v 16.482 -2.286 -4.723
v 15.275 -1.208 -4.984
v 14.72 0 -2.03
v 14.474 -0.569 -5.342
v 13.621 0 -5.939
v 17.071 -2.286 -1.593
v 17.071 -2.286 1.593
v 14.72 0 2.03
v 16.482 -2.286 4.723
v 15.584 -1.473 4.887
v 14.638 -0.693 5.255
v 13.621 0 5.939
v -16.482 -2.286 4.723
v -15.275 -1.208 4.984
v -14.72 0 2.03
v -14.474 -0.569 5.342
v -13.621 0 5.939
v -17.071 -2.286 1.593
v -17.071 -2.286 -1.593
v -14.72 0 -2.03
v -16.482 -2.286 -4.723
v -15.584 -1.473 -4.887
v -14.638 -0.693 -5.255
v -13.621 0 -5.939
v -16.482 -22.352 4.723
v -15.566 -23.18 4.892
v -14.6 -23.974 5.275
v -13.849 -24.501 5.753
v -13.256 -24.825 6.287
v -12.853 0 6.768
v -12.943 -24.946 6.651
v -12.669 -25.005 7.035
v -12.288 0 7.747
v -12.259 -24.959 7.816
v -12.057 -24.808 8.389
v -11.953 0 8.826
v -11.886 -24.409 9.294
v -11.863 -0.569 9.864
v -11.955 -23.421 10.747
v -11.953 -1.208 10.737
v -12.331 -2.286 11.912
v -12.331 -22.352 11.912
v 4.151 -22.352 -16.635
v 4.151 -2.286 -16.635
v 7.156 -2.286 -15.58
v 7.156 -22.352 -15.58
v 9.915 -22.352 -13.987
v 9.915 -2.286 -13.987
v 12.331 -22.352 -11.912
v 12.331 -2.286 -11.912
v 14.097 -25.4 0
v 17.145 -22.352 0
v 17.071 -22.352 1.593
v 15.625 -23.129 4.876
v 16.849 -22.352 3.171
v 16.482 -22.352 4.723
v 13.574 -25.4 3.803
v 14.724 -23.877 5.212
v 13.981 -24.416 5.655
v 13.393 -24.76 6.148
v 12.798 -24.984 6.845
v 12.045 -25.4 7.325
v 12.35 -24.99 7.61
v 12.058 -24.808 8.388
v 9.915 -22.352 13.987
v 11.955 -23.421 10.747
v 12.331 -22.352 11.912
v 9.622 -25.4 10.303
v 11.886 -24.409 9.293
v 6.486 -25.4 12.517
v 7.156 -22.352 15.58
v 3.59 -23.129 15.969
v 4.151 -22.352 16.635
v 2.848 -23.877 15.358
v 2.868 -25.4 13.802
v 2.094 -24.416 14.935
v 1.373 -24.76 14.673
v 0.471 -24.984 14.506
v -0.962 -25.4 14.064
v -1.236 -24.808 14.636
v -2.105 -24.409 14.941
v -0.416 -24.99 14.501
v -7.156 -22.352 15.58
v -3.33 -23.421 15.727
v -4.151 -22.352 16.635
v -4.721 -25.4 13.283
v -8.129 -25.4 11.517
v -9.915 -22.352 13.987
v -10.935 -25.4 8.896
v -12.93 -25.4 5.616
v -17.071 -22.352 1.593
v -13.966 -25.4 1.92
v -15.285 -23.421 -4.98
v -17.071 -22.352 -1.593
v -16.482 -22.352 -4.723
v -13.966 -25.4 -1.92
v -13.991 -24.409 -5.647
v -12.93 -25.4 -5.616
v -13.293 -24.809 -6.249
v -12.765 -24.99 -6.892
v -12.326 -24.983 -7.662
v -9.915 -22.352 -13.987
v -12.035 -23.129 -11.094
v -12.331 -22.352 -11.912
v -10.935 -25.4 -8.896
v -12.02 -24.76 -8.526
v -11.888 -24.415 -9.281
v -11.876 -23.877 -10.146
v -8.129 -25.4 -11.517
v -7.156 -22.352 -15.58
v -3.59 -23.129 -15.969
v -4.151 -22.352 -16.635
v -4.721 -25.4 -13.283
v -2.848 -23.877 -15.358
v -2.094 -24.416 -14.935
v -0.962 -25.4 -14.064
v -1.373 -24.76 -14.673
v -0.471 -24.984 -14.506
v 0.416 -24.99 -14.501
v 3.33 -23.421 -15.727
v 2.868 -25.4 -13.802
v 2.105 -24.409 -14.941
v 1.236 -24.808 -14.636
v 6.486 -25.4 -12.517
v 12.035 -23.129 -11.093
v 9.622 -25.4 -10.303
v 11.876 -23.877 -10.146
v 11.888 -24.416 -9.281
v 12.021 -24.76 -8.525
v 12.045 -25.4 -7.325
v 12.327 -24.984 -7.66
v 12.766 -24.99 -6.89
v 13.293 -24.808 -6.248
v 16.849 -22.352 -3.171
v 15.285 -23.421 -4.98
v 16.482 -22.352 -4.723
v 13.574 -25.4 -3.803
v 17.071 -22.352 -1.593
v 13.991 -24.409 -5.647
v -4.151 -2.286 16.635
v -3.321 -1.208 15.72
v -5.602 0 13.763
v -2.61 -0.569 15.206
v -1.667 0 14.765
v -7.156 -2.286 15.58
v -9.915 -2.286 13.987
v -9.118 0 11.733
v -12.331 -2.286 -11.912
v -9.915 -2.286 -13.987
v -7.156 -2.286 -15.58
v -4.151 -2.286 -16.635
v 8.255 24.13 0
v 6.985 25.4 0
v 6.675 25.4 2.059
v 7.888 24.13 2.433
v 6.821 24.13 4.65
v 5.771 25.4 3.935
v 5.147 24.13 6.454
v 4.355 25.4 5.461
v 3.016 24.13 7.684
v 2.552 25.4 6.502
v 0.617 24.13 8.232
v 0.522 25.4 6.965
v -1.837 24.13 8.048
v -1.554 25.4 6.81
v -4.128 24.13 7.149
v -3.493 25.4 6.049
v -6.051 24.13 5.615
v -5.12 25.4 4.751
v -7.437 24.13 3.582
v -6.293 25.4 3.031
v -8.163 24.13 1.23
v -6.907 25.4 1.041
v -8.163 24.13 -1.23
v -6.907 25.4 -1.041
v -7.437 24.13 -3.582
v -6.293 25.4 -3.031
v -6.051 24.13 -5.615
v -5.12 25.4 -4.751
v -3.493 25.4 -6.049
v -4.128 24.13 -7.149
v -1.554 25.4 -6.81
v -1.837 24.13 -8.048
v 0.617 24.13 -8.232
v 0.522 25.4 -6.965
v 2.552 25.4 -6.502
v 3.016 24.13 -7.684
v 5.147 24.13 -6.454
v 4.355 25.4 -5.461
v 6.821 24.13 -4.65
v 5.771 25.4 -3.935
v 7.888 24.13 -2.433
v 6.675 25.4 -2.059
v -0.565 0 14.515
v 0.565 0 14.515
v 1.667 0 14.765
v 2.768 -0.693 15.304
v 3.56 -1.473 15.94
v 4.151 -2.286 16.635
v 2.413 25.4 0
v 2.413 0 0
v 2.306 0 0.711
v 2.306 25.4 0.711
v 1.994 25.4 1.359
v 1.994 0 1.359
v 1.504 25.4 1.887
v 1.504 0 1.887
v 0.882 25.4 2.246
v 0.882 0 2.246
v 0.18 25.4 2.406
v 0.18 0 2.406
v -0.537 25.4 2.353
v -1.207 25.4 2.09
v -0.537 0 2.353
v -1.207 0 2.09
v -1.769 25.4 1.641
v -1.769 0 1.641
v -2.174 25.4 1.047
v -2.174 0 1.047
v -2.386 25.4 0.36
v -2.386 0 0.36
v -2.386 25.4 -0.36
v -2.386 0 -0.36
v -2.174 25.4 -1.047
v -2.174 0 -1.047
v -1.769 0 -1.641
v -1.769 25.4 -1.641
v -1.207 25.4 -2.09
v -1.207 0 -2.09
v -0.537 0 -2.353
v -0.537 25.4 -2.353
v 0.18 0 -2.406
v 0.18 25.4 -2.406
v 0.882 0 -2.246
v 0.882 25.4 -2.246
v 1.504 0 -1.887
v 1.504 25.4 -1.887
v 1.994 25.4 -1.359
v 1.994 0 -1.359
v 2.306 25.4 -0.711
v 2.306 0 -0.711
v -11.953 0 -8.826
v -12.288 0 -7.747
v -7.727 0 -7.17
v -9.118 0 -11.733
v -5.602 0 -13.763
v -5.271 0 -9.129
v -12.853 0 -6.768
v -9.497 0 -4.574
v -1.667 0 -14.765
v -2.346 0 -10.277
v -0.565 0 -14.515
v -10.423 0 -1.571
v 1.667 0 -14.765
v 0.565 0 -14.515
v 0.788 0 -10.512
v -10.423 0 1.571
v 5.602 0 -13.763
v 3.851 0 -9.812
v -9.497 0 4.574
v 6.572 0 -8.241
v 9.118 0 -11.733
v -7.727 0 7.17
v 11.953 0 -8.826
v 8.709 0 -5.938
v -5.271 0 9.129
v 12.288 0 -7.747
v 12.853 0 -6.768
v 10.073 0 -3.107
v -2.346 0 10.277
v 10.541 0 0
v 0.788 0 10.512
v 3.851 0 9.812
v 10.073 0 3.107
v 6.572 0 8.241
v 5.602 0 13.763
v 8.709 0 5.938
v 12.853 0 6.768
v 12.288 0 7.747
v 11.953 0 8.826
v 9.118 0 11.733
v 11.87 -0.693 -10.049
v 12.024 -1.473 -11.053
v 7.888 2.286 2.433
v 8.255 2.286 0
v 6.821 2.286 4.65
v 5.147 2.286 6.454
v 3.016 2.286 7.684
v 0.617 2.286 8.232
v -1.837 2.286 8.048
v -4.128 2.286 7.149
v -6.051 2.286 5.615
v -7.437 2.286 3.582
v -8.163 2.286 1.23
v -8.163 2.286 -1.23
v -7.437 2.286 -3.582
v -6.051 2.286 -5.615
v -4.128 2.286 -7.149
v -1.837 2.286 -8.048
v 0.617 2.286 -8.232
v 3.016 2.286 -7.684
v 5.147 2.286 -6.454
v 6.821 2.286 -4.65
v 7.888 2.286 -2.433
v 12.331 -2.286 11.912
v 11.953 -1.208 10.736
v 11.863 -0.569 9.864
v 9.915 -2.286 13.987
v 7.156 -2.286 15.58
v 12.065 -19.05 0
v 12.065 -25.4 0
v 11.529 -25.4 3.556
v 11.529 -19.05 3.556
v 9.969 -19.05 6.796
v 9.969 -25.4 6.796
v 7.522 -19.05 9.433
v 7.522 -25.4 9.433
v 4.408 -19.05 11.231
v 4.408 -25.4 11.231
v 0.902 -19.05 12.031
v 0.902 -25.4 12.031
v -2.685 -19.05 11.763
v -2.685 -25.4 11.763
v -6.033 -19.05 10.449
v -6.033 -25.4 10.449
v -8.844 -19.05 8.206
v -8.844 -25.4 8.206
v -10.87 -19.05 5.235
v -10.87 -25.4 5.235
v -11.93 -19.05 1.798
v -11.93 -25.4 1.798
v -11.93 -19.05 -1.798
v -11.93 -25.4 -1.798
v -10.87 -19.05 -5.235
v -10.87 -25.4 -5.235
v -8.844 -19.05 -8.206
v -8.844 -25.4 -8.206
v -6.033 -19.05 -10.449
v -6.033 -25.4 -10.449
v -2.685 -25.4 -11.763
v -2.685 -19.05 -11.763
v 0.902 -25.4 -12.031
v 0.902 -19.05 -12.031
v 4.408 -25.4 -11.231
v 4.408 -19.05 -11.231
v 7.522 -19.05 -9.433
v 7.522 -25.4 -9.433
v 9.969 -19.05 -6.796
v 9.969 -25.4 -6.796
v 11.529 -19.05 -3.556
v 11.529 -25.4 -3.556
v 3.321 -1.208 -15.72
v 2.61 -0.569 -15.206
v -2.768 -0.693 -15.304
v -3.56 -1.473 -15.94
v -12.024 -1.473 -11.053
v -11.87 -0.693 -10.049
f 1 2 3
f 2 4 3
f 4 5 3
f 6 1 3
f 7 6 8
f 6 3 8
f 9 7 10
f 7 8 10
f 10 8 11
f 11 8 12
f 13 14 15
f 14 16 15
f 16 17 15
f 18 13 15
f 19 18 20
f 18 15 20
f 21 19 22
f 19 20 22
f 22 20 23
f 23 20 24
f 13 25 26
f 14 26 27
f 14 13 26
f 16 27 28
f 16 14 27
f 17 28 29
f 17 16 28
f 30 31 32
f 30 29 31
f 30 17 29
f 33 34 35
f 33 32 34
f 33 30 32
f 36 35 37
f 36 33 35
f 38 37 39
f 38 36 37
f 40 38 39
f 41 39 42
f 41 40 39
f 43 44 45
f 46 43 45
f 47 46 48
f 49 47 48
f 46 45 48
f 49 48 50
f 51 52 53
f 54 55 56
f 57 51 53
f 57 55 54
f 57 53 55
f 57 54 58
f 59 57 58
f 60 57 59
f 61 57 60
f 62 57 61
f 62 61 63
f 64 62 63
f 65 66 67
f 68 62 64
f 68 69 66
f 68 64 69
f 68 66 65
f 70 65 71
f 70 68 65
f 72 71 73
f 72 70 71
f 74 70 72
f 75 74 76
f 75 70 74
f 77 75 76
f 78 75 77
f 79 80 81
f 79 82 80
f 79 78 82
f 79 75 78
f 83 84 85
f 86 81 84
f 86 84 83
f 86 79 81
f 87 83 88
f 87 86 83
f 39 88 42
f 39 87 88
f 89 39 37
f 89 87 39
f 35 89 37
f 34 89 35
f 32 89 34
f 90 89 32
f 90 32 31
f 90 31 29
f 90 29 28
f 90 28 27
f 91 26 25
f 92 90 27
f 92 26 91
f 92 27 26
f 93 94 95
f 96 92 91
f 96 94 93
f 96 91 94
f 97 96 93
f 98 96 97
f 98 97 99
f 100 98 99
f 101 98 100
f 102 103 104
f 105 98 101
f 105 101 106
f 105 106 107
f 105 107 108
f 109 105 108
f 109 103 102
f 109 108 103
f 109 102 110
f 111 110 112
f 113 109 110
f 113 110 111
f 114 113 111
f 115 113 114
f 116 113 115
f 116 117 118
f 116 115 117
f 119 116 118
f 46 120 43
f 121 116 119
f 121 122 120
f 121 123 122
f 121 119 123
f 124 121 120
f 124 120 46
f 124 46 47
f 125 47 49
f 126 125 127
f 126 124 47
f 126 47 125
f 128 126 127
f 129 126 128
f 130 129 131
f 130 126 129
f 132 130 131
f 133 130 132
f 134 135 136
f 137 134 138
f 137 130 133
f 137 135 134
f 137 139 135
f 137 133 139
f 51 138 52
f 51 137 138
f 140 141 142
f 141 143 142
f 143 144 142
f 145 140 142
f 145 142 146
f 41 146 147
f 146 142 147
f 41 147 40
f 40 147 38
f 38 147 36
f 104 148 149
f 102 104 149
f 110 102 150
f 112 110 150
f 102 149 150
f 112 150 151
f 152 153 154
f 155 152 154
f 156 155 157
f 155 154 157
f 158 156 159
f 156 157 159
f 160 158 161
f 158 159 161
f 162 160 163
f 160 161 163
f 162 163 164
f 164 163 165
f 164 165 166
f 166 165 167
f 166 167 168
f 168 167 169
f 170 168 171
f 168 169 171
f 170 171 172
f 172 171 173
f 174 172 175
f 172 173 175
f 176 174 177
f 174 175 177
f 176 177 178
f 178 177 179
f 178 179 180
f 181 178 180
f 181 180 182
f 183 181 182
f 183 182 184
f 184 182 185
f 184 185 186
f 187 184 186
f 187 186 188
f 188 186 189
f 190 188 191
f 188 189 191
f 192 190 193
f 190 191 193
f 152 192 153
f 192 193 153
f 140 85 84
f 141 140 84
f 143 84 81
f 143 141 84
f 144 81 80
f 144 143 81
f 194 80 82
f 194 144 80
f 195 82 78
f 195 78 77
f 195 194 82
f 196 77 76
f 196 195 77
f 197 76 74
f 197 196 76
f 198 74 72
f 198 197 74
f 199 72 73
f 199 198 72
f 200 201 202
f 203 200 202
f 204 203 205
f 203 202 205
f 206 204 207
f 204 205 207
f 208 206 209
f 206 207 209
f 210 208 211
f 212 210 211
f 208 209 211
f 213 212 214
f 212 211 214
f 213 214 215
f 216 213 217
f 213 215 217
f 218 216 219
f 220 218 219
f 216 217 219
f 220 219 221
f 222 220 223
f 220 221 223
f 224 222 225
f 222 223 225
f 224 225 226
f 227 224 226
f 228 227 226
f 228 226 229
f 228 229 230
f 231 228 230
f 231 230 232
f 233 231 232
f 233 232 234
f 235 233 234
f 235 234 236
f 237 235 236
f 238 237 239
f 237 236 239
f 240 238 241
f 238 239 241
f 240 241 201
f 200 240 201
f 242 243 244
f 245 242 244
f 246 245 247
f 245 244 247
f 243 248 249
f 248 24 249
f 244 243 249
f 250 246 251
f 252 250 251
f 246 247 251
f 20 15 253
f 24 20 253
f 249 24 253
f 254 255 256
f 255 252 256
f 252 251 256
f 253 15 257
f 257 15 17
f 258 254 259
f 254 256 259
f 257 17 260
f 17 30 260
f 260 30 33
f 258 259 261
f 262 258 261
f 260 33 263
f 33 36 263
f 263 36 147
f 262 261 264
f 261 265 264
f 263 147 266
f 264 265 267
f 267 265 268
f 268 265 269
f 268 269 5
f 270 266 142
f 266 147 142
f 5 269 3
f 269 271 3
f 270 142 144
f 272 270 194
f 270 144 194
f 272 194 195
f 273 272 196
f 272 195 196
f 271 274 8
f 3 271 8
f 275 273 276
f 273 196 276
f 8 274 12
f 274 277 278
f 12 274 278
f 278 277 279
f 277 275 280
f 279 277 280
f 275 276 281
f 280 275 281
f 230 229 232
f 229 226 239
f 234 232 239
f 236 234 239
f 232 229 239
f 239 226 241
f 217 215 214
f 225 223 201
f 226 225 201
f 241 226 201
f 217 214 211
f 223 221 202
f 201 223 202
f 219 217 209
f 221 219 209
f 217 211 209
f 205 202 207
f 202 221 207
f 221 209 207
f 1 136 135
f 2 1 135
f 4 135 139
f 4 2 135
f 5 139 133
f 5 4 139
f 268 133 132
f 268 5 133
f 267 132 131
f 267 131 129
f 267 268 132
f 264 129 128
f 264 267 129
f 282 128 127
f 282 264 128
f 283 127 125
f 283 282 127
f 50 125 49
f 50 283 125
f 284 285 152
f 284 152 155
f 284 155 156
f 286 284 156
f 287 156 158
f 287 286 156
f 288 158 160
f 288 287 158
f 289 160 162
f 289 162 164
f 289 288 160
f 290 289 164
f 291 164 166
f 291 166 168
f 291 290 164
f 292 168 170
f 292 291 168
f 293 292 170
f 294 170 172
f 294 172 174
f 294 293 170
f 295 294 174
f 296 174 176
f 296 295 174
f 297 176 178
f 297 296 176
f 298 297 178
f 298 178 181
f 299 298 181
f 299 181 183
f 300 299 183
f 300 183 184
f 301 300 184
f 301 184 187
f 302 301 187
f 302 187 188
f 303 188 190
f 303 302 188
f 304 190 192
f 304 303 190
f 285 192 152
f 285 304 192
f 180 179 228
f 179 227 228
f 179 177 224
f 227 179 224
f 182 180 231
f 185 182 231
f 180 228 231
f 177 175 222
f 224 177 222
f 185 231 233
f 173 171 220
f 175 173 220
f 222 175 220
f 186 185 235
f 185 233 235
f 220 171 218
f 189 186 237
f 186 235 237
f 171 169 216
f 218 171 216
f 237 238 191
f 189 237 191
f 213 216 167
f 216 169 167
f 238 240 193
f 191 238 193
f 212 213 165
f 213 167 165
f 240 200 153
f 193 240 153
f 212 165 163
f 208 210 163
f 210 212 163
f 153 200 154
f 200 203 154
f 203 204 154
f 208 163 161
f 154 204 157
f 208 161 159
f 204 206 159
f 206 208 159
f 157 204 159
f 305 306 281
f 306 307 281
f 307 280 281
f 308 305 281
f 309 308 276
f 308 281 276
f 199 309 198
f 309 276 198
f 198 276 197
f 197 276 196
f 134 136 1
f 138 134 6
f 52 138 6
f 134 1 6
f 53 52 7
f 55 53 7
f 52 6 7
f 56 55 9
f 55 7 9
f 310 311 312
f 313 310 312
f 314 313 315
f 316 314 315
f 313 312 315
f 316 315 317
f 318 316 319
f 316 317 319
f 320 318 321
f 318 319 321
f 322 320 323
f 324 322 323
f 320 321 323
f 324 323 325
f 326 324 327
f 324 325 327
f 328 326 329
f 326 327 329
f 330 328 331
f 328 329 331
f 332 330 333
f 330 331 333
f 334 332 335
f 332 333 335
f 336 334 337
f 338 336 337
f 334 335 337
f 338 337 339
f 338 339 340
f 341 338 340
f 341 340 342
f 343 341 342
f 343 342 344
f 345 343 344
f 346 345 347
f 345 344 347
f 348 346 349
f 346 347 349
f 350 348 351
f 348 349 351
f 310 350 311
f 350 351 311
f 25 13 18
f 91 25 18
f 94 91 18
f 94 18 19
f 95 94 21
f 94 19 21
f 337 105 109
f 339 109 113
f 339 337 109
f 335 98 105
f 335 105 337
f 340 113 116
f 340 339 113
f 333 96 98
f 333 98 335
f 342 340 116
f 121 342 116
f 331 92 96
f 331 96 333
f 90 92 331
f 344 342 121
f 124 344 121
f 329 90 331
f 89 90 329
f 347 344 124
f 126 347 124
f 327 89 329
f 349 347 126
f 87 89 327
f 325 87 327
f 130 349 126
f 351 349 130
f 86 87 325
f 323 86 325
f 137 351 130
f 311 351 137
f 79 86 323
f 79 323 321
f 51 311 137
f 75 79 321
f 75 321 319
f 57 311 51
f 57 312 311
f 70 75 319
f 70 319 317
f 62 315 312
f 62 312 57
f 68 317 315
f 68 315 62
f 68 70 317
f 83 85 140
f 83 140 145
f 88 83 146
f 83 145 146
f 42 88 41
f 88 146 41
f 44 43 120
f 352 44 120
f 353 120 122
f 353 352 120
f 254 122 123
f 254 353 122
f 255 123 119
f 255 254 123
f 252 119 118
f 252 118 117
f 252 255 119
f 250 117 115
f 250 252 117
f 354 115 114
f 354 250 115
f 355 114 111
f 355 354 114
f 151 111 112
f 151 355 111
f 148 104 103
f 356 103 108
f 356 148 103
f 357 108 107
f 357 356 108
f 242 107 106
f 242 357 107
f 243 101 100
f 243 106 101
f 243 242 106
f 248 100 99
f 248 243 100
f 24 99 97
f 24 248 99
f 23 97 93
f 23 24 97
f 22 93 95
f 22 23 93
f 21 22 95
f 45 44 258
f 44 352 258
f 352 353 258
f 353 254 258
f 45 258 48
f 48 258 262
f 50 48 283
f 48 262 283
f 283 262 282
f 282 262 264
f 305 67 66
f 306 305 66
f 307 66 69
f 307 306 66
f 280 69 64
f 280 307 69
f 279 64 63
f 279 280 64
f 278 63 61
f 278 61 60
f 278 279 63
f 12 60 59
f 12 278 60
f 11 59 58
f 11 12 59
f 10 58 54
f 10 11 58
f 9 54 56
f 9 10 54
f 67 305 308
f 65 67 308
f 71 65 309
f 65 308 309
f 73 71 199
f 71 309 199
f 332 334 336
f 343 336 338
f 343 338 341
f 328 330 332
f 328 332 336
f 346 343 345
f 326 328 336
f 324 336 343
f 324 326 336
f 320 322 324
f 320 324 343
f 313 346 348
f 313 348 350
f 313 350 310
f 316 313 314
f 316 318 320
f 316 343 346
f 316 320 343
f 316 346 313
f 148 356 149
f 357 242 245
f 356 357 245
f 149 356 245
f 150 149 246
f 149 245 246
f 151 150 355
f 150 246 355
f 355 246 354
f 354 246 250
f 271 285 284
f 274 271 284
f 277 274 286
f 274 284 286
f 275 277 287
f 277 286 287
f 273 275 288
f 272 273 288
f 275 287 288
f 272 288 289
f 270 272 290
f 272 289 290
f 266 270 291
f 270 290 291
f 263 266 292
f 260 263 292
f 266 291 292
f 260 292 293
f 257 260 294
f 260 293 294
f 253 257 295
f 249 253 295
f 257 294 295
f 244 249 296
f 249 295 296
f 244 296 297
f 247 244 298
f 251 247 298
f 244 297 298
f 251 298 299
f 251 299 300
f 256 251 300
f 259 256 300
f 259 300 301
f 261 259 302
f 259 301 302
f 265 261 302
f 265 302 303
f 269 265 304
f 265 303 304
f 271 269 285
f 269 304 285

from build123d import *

# Parameters (mm, degrees)
F0_R      = 17.145
F5_DEPTH  = 25.4
F1_R      = 8.255
F6_DEPTH  = 25.4
F2_R      = 2.413
F7_DEPTH  = 25.4
F9_SIZE   = 3.048
F10_SIZE  = 2.286
F8_R      = 5.08
F11_DEPTH = 25.4
F4_R      = 12.065
F12_DEPTH = 6.35
F13_SIZE  = 1.27


with BuildPart() as f5:
    # F0 (on Front) → F5 (new body)
    with BuildSketch(Plane.XZ):
        Circle(F0_R)
    extrude(amount=F5_DEPTH)

    # F1 (on Front) → F6 (join)
    with BuildSketch(Plane.XZ):
        Circle(F1_R)
    extrude(amount=-F6_DEPTH)

    # F2 (on Front) → F7 (cut)
    with BuildSketch(Plane.XZ):
        Circle(F2_R)
    extrude(amount=-F7_DEPTH, mode=Mode.SUBTRACT)

    # F9
    f9_edges = [f5.edges().sort_by_distance(p)[0] for p in [
        (-17.145, -25.4, 0),
    ]]
    chamfer(f9_edges, length=F9_SIZE)

    # F10
    f10_edges = [f5.edges().sort_by_distance(p)[0] for p in [
        (-17.145, 0, 0),
        (-8.255, 0, 0),
    ]]
    chamfer(f10_edges, length=F10_SIZE)

    # F8 (on Front) → F11 (cut)
    with BuildSketch(Plane.XZ):
        with Locations((0, 19.5638593286)):
            Circle(F8_R)
        with Locations((-16.9427991747, 9.7819296643)):
            Circle(F8_R)
        with Locations((-16.9427991747, -9.7819296643)):
            Circle(F8_R)
        with Locations((0, -19.5638593286)):
            Circle(F8_R)
        with Locations((16.9427991747, -9.7819296643)):
            Circle(F8_R)
        with Locations((16.9427991747, 9.7819296643)):
            Circle(F8_R)
    extrude(amount=F11_DEPTH, mode=Mode.SUBTRACT)

    # F4 (on offset) → F12 (cut)
    with BuildSketch(Plane.XZ.offset(25.4)):
        Circle(F4_R)
    extrude(amount=-F12_DEPTH, mode=Mode.SUBTRACT)

    # F13
    f13_edges = [f5.edges().sort_by_distance(p)[0] for p in [
        (-8.255, 25.4, 0),
    ]]
    chamfer(f13_edges, length=F13_SIZE)


solid = f5.part
